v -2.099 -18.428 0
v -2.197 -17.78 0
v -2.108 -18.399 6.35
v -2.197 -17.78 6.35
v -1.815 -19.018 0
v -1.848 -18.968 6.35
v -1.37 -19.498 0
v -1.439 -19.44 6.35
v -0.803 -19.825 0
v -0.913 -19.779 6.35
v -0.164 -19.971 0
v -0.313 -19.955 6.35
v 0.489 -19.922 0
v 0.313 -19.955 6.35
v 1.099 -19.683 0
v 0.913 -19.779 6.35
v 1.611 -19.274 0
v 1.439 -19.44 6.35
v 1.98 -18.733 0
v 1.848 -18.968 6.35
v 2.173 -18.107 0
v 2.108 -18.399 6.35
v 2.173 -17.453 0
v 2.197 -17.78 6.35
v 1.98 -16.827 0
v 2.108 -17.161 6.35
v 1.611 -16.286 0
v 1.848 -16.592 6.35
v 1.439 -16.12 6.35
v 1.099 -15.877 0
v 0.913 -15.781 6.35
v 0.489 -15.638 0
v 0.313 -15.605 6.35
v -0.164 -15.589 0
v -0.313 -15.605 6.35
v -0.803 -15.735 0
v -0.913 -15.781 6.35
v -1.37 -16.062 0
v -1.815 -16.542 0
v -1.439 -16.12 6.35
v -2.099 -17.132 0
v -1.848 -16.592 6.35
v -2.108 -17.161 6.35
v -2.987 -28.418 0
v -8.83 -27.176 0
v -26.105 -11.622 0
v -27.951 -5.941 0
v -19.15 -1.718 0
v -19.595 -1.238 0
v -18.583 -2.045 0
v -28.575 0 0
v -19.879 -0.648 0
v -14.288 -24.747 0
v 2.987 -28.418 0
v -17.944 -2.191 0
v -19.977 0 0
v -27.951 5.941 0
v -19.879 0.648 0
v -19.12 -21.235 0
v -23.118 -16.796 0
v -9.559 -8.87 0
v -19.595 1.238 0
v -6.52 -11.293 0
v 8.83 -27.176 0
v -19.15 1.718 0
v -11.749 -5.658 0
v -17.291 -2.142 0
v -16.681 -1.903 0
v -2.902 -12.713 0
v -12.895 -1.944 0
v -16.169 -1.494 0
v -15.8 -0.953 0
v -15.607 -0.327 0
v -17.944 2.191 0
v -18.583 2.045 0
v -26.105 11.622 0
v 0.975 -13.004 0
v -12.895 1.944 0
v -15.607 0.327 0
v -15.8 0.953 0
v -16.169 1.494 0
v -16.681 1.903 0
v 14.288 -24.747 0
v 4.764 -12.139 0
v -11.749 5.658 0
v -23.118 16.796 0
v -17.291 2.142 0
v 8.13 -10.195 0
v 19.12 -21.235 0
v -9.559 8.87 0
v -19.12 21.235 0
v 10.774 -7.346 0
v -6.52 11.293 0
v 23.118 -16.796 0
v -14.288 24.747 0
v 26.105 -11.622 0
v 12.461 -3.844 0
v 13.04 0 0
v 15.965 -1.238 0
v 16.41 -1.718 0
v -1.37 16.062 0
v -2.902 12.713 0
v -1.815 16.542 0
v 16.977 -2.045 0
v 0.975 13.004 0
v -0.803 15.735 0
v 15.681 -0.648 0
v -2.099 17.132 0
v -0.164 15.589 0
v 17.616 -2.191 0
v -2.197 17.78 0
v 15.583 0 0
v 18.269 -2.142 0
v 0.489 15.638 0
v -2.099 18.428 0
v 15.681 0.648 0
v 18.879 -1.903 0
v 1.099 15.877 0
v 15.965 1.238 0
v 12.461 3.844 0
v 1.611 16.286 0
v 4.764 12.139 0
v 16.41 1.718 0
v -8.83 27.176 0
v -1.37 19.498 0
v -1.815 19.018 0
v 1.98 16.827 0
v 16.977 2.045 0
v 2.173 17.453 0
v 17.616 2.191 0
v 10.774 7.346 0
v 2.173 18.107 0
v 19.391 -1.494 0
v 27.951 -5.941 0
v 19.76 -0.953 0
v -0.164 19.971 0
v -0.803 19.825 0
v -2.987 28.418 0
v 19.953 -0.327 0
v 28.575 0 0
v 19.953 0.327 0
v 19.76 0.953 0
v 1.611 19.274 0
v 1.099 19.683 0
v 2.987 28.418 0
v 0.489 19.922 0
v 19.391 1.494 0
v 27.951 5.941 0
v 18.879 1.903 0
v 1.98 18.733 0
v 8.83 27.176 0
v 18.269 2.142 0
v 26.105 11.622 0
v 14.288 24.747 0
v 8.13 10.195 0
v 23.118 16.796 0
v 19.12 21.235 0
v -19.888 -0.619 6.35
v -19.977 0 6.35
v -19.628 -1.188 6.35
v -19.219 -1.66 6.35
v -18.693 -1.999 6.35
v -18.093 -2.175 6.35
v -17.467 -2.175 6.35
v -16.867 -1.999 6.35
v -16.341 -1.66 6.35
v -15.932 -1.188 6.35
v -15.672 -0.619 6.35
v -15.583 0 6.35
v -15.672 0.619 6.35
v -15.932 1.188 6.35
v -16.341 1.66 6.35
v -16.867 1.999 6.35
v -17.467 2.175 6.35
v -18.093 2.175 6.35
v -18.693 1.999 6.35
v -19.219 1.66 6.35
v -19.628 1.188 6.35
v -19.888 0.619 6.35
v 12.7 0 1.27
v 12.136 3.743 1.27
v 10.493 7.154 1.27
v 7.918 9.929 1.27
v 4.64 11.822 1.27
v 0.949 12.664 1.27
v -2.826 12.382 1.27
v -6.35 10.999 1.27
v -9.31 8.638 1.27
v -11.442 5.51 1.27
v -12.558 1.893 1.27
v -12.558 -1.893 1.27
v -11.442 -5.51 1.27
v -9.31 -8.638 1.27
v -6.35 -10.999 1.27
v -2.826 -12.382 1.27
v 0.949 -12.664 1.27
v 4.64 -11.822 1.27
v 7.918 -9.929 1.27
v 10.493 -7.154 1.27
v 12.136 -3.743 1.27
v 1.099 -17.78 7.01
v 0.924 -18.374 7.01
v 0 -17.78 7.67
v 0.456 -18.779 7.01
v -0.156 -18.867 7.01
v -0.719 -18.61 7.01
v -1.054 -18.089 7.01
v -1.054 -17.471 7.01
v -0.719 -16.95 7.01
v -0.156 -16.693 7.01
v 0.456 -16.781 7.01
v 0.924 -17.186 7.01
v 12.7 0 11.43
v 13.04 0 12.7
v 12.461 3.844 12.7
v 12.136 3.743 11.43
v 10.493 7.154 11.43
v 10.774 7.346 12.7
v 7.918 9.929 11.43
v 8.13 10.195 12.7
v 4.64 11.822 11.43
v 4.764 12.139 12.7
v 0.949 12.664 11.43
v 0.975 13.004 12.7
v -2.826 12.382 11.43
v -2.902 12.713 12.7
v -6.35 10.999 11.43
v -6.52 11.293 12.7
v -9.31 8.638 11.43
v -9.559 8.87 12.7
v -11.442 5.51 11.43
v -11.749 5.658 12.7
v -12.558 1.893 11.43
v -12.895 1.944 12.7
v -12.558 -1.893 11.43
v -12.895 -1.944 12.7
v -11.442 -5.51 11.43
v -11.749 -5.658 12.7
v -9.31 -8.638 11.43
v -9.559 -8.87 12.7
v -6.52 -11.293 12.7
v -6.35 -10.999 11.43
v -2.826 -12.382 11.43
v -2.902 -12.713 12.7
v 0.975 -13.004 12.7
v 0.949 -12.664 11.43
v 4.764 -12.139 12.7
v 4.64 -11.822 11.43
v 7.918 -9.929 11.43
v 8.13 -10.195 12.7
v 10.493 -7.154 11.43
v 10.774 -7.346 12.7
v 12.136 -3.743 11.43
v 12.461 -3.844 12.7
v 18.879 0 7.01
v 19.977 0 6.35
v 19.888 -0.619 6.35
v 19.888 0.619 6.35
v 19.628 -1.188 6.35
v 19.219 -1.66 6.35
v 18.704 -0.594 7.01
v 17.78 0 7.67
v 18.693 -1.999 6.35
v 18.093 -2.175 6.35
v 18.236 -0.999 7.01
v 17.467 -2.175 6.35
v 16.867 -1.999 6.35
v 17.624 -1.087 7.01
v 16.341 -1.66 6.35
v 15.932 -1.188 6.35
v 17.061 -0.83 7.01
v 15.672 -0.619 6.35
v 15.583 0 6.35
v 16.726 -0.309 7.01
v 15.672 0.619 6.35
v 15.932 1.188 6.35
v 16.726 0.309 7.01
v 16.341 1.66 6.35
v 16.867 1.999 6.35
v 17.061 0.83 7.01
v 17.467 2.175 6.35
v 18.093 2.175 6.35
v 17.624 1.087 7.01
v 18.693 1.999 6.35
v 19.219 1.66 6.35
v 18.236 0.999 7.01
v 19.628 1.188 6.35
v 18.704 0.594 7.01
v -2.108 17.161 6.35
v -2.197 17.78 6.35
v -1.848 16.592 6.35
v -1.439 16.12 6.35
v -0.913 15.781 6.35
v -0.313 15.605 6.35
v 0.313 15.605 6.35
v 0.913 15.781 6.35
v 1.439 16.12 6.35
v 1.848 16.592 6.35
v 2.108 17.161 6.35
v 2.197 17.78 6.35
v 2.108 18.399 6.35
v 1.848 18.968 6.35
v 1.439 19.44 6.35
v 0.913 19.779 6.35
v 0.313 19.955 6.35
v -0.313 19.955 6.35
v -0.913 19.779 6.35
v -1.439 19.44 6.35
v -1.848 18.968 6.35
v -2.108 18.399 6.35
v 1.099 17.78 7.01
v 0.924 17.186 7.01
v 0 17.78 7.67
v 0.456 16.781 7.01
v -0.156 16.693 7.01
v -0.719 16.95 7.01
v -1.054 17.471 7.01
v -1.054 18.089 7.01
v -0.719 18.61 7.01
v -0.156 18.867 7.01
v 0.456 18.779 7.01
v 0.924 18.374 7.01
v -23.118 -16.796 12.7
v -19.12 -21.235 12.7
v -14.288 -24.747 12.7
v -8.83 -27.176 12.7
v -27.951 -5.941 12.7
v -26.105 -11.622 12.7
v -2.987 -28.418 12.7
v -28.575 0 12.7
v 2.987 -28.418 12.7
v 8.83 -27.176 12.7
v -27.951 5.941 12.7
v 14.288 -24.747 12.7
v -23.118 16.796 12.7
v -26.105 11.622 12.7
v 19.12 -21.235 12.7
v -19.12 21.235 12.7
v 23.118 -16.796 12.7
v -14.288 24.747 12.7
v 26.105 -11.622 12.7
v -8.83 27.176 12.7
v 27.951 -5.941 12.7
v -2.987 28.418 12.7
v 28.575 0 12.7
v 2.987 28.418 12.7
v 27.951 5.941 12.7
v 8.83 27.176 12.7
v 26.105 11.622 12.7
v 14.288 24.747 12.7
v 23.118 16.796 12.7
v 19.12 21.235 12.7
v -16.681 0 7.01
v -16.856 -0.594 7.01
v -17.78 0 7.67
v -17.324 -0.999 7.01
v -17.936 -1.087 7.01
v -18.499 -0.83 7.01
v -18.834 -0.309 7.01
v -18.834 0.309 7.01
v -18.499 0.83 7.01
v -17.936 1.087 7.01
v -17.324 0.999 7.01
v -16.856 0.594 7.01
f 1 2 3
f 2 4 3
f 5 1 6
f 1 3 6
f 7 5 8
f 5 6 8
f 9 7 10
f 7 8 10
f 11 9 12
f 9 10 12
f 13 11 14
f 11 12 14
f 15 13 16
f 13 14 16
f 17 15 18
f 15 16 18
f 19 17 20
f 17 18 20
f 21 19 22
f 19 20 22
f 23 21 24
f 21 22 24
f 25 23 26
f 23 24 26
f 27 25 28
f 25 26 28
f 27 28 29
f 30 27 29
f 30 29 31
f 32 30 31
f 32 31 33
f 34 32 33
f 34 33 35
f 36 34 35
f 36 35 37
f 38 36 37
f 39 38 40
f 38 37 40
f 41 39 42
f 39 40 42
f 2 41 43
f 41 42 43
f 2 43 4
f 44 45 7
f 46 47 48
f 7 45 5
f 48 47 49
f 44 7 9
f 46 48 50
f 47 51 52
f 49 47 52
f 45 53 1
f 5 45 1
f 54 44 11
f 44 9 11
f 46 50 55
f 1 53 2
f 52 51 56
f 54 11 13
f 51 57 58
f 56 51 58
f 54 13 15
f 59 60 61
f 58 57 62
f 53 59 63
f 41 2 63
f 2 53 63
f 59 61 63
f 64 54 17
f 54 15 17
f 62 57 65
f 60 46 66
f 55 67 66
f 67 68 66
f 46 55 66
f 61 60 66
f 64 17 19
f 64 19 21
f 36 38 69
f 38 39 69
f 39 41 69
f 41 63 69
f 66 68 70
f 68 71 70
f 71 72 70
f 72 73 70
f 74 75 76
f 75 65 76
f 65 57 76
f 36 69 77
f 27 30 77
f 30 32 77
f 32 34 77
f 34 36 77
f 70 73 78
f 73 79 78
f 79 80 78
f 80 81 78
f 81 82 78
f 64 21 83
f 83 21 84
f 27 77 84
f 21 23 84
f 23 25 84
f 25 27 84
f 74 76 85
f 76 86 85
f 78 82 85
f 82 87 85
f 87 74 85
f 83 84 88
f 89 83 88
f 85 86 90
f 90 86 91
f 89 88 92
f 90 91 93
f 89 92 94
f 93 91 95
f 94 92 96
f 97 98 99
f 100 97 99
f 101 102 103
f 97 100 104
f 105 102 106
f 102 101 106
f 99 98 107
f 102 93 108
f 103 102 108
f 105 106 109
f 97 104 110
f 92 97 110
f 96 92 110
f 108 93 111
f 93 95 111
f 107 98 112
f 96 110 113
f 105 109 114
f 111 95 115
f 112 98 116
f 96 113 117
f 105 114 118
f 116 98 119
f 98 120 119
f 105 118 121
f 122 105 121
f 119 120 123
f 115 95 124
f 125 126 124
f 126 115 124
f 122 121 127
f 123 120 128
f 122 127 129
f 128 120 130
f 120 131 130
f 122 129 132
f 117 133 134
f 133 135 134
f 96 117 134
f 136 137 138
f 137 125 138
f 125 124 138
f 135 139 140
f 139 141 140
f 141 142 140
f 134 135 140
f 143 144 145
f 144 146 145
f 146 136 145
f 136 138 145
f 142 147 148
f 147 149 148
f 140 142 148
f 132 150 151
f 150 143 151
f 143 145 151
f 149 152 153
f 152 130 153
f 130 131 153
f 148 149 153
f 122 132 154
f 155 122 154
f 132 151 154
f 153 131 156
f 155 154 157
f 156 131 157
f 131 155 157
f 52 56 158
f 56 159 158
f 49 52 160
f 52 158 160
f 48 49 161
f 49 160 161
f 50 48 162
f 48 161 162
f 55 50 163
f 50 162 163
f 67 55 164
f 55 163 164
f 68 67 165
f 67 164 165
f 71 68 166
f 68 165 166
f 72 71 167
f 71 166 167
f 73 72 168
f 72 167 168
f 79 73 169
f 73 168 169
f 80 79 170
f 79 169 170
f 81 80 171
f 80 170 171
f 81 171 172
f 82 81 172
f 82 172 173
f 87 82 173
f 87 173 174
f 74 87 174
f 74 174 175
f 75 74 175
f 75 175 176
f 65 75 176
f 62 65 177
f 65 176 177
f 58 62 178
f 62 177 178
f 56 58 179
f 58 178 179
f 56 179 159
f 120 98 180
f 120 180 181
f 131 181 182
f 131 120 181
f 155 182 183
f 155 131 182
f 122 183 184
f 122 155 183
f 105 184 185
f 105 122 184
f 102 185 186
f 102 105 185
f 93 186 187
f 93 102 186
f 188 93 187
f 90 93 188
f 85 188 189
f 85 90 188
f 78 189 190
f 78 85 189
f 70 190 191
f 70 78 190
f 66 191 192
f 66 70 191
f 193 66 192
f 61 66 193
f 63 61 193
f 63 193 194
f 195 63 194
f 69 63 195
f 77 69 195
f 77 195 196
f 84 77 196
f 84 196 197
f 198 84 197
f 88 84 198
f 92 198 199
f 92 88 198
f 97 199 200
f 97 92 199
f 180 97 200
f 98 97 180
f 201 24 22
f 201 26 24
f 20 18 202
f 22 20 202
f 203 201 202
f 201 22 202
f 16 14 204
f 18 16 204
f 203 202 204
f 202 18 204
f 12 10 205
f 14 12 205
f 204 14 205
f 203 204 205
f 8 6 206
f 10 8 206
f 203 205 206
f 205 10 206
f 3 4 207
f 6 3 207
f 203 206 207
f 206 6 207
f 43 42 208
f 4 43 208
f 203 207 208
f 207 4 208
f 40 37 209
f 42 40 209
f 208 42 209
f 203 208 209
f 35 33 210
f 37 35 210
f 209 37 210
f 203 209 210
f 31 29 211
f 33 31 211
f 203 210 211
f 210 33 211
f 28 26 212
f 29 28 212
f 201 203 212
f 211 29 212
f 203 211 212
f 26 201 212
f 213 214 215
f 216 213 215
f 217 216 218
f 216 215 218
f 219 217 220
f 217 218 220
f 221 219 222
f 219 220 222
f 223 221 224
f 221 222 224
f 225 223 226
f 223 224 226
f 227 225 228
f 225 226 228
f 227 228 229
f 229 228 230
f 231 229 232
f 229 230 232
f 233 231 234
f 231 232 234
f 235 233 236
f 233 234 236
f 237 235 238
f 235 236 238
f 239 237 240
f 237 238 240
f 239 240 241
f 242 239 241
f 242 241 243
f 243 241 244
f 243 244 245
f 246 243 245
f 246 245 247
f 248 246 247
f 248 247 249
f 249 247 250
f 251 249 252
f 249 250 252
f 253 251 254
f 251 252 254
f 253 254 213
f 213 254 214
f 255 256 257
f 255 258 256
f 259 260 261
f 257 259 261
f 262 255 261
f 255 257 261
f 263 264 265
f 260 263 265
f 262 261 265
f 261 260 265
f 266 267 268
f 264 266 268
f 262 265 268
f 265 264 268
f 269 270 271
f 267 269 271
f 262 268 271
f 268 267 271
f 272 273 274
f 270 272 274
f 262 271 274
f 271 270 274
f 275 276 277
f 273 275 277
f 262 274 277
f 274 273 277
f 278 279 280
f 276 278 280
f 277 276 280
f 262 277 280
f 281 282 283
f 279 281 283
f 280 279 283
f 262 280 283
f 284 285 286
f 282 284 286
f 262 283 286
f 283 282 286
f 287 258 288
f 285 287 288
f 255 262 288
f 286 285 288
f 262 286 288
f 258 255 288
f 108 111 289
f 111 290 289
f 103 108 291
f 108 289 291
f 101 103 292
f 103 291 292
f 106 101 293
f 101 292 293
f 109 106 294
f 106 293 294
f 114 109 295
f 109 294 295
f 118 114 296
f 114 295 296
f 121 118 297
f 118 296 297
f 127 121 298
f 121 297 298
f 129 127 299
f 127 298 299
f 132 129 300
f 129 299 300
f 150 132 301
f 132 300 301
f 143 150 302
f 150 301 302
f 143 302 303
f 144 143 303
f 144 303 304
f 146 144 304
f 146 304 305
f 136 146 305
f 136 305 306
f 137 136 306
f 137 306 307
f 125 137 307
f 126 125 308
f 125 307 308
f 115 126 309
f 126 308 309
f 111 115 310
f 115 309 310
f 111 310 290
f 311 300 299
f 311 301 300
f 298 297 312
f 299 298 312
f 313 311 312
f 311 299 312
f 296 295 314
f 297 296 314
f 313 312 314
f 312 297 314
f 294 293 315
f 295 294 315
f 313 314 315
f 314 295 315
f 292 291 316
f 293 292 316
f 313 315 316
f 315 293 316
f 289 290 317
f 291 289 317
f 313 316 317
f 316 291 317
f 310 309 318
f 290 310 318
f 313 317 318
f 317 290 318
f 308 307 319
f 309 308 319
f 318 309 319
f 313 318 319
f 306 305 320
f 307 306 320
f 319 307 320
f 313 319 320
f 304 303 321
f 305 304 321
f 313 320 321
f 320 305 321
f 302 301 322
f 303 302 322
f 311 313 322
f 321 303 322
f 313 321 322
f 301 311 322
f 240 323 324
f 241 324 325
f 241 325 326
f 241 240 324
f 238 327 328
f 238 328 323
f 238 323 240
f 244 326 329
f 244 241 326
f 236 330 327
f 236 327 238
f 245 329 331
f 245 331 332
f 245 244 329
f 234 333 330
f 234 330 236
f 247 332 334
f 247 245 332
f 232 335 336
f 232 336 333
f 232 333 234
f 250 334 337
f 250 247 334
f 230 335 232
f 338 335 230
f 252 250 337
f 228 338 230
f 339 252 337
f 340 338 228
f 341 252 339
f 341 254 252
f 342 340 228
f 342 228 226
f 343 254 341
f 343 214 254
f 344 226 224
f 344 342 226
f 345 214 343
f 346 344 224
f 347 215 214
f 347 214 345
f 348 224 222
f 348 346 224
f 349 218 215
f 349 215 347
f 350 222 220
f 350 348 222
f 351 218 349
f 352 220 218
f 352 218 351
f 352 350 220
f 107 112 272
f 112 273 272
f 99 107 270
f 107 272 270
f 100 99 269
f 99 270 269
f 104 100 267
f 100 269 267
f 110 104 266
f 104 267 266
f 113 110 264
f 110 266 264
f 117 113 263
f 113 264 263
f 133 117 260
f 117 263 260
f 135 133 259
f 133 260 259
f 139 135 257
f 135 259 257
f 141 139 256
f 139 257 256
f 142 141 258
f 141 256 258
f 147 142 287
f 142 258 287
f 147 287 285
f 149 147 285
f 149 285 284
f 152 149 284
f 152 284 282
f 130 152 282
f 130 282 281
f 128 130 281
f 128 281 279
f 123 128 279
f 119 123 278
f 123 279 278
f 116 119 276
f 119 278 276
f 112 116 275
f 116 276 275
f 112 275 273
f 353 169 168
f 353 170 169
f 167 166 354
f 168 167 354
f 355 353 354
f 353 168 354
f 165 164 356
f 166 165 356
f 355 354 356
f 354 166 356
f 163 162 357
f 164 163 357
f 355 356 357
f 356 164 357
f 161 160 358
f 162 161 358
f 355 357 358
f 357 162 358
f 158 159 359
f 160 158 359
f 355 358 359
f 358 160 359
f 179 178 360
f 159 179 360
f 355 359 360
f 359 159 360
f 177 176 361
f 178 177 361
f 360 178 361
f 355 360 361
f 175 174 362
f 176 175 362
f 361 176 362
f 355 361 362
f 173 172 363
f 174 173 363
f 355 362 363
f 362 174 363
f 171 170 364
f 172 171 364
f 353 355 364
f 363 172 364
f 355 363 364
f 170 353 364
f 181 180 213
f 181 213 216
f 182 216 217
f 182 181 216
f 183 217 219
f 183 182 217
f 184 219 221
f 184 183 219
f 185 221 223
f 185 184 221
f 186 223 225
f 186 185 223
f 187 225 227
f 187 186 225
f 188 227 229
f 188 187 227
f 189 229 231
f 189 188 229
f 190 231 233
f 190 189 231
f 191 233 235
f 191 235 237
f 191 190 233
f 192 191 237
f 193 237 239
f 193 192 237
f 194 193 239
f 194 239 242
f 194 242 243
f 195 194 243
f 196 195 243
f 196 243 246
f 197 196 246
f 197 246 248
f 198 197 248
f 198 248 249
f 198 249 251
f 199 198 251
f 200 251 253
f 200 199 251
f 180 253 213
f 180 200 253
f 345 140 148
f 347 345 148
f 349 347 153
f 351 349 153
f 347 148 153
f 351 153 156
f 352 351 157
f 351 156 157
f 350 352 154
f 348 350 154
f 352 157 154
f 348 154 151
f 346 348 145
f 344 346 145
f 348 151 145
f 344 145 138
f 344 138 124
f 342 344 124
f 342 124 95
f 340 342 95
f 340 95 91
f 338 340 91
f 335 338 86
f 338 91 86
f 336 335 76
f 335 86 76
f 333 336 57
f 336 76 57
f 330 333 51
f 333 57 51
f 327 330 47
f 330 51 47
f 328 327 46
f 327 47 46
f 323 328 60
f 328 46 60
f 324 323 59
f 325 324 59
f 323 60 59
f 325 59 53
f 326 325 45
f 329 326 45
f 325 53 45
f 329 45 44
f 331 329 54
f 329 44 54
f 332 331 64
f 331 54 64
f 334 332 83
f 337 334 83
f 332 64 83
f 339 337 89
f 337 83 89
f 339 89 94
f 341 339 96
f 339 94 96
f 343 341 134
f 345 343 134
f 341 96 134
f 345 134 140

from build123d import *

# Parameters (mm, degrees)
F0_R     = 28.575
F0_R_2   = 12.7
F1_DEPTH = 12.7
F2_SIZE2 = 0.3402954744
F2_SIZE  = 1.27
F4_D     = 4.3942
F4_DEPTH = 6.35
F4_TIP   = 1.3201508661


with BuildPart() as f1:
    # F0 (on Top) → F1 (new body)
    with BuildSketch(Plane.XY):
        Circle(F0_R)
        Circle(F0_R_2, mode=Mode.SUBTRACT)
    extrude(amount=F1_DEPTH)

    # F2
    f2_edges = [f1.edges().sort_by_distance(p)[0] for p in [
        (-12.7, 0, 12.7),
        (-12.7, 0, 0),
    ]]
    f2_side = f1.faces().sort_by_distance((-12.7, 0, 6.35))[0]
    chamfer(f2_edges, length=F2_SIZE, length2=F2_SIZE2, reference=f2_side)

    # F4
    with Locations(Plane(origin=(0, 0, 0), x_dir=(1, 0, 0), z_dir=(0, 0, -1))):
        with Locations((0, -17.78), (-17.78, 0), (0, 17.78), (17.78, 0)):
            Hole(F4_D / 2, depth=F4_DEPTH)
            with Locations((0, 0, -(F4_DEPTH + F4_TIP / 2))):  # 118° drill point
                Cone(0, F4_D / 2, F4_TIP, mode=Mode.SUBTRACT)


solid = f1.part
